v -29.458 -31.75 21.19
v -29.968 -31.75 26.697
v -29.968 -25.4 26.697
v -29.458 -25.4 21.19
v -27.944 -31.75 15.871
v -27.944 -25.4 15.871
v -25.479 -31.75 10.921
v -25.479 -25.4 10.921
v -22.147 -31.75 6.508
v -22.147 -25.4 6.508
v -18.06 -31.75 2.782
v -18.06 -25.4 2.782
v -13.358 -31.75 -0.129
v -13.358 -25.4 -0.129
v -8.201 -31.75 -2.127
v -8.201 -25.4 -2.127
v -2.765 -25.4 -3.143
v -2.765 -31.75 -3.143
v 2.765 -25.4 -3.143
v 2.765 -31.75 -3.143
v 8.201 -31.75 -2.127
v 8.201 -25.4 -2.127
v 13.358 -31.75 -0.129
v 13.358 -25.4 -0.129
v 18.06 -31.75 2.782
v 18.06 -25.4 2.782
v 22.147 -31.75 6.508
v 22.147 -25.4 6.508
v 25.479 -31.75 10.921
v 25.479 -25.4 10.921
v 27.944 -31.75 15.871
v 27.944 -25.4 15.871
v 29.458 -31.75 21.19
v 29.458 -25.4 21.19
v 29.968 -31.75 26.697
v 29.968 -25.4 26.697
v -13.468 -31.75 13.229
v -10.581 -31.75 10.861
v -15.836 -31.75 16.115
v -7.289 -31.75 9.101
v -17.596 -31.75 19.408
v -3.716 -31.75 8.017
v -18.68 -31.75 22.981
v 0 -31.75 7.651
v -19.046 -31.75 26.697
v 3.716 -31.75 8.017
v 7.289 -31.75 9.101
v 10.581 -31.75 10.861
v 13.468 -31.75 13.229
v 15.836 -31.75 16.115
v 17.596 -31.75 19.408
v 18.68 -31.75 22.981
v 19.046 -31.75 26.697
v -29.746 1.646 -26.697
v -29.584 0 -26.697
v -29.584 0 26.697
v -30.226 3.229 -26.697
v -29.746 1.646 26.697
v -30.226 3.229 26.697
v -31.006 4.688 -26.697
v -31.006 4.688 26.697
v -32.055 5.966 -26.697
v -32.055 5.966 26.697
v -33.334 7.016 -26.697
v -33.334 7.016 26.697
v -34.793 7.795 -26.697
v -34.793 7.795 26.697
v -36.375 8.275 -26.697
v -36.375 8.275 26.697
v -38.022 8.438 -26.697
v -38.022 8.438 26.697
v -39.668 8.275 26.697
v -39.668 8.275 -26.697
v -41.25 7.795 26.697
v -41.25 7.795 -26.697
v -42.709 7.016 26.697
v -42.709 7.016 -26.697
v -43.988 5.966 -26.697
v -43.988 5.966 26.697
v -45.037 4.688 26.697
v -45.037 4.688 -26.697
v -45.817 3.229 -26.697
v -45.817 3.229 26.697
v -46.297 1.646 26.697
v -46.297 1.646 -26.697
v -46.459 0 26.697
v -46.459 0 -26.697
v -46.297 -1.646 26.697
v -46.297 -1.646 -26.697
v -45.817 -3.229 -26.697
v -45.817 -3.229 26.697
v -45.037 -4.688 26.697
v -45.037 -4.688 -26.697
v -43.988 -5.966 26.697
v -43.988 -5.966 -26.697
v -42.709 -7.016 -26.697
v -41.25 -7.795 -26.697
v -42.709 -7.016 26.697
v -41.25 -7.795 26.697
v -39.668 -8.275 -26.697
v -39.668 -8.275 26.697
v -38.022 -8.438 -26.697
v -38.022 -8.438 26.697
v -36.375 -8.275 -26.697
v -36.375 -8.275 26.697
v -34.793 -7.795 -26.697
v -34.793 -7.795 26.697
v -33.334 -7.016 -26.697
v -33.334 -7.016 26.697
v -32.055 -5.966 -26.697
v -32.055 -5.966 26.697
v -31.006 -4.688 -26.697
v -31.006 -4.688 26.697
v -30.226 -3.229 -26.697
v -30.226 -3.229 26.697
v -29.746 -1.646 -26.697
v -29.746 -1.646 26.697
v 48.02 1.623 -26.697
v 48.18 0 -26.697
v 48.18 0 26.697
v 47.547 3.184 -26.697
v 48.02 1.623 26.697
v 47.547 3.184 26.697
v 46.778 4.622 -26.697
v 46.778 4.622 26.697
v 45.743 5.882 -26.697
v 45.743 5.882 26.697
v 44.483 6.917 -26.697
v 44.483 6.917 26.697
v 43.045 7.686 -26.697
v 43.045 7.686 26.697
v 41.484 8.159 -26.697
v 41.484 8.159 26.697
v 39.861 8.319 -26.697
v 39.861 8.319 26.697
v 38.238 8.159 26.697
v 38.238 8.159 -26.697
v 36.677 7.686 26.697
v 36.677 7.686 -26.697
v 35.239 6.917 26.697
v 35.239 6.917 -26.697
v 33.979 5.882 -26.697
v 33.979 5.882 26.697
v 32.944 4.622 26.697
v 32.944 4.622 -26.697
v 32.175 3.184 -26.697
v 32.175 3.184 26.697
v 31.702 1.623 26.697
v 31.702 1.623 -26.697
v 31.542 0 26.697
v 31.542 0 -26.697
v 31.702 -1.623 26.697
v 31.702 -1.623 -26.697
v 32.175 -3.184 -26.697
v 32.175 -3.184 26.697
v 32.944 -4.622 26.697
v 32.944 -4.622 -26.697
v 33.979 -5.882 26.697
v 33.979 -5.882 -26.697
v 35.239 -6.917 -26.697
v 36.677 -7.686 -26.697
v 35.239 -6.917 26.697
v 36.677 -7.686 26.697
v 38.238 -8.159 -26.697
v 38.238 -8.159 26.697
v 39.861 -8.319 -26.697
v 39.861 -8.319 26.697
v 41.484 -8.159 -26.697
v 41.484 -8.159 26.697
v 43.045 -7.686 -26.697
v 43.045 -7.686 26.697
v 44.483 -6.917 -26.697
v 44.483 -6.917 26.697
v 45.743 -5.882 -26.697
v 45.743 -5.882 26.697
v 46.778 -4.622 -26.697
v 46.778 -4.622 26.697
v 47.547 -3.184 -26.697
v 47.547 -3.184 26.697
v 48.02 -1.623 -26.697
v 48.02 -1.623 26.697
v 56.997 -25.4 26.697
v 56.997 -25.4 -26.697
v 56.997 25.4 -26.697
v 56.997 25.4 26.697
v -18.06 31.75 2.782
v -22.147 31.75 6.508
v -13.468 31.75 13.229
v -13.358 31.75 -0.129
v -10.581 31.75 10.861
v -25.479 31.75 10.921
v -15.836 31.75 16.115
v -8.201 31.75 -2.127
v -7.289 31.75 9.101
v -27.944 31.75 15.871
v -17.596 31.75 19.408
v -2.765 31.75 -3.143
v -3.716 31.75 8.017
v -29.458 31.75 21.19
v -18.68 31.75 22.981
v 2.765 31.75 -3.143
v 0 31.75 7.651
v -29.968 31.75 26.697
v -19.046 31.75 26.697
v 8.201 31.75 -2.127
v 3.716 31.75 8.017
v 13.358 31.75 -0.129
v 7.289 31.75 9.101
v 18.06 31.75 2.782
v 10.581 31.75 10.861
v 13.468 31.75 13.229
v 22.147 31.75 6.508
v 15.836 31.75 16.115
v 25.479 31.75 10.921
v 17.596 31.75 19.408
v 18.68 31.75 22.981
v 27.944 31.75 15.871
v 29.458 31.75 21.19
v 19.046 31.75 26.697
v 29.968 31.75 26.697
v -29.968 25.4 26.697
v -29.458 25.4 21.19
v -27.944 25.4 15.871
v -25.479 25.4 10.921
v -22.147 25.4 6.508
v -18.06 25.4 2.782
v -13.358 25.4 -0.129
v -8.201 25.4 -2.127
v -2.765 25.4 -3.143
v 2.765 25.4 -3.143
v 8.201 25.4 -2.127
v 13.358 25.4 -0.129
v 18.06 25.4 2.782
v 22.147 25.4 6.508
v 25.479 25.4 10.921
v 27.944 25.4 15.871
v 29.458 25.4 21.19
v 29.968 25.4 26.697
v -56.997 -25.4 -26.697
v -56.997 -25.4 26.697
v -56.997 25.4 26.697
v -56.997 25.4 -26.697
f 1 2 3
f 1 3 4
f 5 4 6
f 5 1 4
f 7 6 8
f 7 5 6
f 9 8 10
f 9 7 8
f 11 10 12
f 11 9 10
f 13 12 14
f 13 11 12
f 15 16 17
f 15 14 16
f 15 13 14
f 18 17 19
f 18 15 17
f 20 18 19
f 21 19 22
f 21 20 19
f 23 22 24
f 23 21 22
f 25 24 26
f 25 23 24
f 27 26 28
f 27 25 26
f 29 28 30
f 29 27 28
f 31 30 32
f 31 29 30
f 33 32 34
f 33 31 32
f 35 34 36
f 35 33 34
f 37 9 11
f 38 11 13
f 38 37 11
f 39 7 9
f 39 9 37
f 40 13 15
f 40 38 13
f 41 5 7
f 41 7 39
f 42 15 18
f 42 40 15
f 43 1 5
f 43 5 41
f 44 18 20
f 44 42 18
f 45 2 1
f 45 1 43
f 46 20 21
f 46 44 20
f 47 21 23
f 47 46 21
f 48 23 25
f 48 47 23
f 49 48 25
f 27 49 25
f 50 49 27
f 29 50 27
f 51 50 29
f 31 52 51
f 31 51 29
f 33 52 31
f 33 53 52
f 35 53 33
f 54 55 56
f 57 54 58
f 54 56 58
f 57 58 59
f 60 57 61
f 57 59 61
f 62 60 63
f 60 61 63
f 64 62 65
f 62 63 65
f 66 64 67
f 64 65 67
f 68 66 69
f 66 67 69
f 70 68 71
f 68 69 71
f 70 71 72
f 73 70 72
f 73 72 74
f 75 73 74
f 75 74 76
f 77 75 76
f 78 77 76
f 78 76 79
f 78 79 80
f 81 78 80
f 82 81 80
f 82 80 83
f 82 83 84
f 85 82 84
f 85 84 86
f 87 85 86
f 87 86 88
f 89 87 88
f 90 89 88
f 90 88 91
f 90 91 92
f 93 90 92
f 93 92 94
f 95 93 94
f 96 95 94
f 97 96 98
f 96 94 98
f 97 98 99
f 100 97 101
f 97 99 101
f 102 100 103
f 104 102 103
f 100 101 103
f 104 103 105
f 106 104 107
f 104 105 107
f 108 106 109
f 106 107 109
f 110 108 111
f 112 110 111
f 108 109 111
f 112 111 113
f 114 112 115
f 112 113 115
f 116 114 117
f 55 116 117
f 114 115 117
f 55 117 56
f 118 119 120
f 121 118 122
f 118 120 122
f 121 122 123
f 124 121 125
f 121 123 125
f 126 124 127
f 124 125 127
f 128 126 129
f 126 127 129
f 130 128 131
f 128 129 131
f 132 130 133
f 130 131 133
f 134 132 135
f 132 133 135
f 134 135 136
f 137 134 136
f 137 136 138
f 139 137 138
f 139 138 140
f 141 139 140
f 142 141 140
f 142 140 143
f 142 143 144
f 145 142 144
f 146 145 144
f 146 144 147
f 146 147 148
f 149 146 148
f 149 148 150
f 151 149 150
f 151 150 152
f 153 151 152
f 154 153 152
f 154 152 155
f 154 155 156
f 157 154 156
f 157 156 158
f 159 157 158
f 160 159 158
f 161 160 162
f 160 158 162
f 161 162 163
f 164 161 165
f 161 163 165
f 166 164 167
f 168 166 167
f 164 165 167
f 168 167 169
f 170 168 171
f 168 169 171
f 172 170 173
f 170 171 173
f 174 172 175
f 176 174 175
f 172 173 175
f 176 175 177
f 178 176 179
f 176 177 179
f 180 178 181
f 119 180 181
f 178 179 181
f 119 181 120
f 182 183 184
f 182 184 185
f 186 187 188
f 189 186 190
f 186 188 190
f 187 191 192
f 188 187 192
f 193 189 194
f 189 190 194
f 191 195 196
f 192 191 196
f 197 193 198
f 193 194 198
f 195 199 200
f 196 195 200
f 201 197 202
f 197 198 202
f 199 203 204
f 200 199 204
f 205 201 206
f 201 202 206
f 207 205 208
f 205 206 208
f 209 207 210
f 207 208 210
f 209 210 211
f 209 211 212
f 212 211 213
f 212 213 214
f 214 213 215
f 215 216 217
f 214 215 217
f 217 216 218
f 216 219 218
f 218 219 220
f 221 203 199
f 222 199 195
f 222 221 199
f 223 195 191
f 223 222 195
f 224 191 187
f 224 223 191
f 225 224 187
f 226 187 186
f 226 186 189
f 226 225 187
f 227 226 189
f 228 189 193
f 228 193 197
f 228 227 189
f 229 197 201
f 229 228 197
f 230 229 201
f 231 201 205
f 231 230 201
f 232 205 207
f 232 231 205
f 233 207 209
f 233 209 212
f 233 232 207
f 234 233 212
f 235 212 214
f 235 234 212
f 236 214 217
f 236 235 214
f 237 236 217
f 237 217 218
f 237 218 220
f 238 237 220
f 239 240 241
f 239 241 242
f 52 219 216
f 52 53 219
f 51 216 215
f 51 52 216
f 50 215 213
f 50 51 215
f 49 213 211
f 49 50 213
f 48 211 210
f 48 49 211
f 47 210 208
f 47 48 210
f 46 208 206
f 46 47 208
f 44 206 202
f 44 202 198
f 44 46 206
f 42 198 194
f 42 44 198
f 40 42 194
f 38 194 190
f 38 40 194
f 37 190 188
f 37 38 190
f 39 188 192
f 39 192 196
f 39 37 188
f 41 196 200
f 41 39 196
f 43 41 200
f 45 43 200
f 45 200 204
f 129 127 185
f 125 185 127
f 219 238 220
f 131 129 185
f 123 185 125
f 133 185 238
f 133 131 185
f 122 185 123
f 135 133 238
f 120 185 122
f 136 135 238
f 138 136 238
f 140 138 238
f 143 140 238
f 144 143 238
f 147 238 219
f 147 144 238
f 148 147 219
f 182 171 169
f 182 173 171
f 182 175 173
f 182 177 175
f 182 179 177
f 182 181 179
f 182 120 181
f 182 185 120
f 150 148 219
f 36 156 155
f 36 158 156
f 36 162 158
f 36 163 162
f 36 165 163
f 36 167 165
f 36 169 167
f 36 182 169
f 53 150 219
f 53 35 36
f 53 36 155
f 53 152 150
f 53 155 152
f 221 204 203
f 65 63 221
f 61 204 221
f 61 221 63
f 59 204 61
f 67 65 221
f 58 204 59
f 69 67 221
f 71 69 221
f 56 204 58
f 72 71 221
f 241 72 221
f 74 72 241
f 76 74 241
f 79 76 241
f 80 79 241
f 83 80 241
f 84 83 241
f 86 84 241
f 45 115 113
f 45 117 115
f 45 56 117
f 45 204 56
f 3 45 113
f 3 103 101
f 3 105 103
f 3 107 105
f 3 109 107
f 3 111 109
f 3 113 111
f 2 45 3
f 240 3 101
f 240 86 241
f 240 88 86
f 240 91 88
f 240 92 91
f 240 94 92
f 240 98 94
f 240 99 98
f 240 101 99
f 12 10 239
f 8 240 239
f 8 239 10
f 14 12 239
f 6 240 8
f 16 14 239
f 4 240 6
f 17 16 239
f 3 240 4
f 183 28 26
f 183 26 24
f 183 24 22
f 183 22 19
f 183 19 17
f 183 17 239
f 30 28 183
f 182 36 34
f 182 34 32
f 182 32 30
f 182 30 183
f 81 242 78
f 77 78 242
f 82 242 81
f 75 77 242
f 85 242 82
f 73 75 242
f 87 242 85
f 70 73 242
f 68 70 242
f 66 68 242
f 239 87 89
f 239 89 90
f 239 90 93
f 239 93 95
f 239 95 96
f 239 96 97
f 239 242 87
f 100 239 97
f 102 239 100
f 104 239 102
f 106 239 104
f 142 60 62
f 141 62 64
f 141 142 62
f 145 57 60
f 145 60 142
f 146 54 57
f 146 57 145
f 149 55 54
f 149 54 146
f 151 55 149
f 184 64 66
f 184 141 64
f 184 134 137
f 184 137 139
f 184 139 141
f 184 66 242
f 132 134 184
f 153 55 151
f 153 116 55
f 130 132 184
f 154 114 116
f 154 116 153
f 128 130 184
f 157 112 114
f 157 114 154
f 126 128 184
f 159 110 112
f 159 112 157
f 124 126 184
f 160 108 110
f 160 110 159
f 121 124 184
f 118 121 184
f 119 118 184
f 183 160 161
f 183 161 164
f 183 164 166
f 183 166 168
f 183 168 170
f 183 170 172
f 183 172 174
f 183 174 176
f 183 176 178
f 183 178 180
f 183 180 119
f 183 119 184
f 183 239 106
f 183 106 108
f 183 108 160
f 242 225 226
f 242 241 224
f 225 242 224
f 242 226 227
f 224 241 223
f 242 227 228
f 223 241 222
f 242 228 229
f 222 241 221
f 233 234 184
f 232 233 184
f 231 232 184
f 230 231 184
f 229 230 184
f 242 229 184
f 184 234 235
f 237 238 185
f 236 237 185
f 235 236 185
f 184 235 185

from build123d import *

# Parameters (mm, degrees)
F1_DEPTH = 25.4
F2_DEPTH = 31.75
F3_R     = 8.4375422203
F3_R_2   = 8.3190886378
F4_DEPTH = 74.422


with BuildPart() as f1:
    # F0 (on Front) → F1 (new body, symmetric)
    with BuildSketch(Plane.XZ):
        with BuildLine():
            Line((-29.9681008023, 26.6969427466), (-56.9970235229, 26.6969427466))
            Line((-56.9970235229, 26.6969427466), (-56.9970235229, -26.6969427466))
            Line((-56.9970235229, -26.6969427466), (56.9970235229, -26.6969427466))
            Line((56.9970235229, -26.6969427466), (56.9970235229, 26.6969427466))
            Line((56.9970235229, 26.6969427466), (29.9681008023, 26.6969427466))
            ThreePointArc((29.9681008023, 26.6969427466), (0, -3.2711580556), (-29.9681008023, 26.6969427466))
        make_face()
    extrude(amount=F1_DEPTH, both=True)

    # F0 (on Front) → F2 (join, symmetric)
    with BuildSketch(Plane.XZ):
        with BuildLine():
            Line((-19.0461007878, 26.6969427466), (-29.9681008023, 26.6969427466))
            ThreePointArc((-29.9681008023, 26.6969427466), (0, -3.2711580556), (29.9681008023, 26.6969427466))
            Line((29.9681008023, 26.6969427466), (19.0461007878, 26.6969427466))
            ThreePointArc((19.0461007878, 26.6969427466), (0, 7.6508419588), (-19.0461007878, 26.6969427466))
        make_face()
    extrude(amount=F2_DEPTH, both=True)

    # F3 (on face) → F4 (cut)
    with BuildSketch(Plane.XY.offset(26.6969427466)):
        with Locations((-38.0215607584, 0)):
            Circle(F3_R)
        with Locations((39.8610122502, 0)):
            Circle(F3_R_2)
    extrude(amount=-F4_DEPTH, mode=Mode.SUBTRACT)


solid = f1.part
